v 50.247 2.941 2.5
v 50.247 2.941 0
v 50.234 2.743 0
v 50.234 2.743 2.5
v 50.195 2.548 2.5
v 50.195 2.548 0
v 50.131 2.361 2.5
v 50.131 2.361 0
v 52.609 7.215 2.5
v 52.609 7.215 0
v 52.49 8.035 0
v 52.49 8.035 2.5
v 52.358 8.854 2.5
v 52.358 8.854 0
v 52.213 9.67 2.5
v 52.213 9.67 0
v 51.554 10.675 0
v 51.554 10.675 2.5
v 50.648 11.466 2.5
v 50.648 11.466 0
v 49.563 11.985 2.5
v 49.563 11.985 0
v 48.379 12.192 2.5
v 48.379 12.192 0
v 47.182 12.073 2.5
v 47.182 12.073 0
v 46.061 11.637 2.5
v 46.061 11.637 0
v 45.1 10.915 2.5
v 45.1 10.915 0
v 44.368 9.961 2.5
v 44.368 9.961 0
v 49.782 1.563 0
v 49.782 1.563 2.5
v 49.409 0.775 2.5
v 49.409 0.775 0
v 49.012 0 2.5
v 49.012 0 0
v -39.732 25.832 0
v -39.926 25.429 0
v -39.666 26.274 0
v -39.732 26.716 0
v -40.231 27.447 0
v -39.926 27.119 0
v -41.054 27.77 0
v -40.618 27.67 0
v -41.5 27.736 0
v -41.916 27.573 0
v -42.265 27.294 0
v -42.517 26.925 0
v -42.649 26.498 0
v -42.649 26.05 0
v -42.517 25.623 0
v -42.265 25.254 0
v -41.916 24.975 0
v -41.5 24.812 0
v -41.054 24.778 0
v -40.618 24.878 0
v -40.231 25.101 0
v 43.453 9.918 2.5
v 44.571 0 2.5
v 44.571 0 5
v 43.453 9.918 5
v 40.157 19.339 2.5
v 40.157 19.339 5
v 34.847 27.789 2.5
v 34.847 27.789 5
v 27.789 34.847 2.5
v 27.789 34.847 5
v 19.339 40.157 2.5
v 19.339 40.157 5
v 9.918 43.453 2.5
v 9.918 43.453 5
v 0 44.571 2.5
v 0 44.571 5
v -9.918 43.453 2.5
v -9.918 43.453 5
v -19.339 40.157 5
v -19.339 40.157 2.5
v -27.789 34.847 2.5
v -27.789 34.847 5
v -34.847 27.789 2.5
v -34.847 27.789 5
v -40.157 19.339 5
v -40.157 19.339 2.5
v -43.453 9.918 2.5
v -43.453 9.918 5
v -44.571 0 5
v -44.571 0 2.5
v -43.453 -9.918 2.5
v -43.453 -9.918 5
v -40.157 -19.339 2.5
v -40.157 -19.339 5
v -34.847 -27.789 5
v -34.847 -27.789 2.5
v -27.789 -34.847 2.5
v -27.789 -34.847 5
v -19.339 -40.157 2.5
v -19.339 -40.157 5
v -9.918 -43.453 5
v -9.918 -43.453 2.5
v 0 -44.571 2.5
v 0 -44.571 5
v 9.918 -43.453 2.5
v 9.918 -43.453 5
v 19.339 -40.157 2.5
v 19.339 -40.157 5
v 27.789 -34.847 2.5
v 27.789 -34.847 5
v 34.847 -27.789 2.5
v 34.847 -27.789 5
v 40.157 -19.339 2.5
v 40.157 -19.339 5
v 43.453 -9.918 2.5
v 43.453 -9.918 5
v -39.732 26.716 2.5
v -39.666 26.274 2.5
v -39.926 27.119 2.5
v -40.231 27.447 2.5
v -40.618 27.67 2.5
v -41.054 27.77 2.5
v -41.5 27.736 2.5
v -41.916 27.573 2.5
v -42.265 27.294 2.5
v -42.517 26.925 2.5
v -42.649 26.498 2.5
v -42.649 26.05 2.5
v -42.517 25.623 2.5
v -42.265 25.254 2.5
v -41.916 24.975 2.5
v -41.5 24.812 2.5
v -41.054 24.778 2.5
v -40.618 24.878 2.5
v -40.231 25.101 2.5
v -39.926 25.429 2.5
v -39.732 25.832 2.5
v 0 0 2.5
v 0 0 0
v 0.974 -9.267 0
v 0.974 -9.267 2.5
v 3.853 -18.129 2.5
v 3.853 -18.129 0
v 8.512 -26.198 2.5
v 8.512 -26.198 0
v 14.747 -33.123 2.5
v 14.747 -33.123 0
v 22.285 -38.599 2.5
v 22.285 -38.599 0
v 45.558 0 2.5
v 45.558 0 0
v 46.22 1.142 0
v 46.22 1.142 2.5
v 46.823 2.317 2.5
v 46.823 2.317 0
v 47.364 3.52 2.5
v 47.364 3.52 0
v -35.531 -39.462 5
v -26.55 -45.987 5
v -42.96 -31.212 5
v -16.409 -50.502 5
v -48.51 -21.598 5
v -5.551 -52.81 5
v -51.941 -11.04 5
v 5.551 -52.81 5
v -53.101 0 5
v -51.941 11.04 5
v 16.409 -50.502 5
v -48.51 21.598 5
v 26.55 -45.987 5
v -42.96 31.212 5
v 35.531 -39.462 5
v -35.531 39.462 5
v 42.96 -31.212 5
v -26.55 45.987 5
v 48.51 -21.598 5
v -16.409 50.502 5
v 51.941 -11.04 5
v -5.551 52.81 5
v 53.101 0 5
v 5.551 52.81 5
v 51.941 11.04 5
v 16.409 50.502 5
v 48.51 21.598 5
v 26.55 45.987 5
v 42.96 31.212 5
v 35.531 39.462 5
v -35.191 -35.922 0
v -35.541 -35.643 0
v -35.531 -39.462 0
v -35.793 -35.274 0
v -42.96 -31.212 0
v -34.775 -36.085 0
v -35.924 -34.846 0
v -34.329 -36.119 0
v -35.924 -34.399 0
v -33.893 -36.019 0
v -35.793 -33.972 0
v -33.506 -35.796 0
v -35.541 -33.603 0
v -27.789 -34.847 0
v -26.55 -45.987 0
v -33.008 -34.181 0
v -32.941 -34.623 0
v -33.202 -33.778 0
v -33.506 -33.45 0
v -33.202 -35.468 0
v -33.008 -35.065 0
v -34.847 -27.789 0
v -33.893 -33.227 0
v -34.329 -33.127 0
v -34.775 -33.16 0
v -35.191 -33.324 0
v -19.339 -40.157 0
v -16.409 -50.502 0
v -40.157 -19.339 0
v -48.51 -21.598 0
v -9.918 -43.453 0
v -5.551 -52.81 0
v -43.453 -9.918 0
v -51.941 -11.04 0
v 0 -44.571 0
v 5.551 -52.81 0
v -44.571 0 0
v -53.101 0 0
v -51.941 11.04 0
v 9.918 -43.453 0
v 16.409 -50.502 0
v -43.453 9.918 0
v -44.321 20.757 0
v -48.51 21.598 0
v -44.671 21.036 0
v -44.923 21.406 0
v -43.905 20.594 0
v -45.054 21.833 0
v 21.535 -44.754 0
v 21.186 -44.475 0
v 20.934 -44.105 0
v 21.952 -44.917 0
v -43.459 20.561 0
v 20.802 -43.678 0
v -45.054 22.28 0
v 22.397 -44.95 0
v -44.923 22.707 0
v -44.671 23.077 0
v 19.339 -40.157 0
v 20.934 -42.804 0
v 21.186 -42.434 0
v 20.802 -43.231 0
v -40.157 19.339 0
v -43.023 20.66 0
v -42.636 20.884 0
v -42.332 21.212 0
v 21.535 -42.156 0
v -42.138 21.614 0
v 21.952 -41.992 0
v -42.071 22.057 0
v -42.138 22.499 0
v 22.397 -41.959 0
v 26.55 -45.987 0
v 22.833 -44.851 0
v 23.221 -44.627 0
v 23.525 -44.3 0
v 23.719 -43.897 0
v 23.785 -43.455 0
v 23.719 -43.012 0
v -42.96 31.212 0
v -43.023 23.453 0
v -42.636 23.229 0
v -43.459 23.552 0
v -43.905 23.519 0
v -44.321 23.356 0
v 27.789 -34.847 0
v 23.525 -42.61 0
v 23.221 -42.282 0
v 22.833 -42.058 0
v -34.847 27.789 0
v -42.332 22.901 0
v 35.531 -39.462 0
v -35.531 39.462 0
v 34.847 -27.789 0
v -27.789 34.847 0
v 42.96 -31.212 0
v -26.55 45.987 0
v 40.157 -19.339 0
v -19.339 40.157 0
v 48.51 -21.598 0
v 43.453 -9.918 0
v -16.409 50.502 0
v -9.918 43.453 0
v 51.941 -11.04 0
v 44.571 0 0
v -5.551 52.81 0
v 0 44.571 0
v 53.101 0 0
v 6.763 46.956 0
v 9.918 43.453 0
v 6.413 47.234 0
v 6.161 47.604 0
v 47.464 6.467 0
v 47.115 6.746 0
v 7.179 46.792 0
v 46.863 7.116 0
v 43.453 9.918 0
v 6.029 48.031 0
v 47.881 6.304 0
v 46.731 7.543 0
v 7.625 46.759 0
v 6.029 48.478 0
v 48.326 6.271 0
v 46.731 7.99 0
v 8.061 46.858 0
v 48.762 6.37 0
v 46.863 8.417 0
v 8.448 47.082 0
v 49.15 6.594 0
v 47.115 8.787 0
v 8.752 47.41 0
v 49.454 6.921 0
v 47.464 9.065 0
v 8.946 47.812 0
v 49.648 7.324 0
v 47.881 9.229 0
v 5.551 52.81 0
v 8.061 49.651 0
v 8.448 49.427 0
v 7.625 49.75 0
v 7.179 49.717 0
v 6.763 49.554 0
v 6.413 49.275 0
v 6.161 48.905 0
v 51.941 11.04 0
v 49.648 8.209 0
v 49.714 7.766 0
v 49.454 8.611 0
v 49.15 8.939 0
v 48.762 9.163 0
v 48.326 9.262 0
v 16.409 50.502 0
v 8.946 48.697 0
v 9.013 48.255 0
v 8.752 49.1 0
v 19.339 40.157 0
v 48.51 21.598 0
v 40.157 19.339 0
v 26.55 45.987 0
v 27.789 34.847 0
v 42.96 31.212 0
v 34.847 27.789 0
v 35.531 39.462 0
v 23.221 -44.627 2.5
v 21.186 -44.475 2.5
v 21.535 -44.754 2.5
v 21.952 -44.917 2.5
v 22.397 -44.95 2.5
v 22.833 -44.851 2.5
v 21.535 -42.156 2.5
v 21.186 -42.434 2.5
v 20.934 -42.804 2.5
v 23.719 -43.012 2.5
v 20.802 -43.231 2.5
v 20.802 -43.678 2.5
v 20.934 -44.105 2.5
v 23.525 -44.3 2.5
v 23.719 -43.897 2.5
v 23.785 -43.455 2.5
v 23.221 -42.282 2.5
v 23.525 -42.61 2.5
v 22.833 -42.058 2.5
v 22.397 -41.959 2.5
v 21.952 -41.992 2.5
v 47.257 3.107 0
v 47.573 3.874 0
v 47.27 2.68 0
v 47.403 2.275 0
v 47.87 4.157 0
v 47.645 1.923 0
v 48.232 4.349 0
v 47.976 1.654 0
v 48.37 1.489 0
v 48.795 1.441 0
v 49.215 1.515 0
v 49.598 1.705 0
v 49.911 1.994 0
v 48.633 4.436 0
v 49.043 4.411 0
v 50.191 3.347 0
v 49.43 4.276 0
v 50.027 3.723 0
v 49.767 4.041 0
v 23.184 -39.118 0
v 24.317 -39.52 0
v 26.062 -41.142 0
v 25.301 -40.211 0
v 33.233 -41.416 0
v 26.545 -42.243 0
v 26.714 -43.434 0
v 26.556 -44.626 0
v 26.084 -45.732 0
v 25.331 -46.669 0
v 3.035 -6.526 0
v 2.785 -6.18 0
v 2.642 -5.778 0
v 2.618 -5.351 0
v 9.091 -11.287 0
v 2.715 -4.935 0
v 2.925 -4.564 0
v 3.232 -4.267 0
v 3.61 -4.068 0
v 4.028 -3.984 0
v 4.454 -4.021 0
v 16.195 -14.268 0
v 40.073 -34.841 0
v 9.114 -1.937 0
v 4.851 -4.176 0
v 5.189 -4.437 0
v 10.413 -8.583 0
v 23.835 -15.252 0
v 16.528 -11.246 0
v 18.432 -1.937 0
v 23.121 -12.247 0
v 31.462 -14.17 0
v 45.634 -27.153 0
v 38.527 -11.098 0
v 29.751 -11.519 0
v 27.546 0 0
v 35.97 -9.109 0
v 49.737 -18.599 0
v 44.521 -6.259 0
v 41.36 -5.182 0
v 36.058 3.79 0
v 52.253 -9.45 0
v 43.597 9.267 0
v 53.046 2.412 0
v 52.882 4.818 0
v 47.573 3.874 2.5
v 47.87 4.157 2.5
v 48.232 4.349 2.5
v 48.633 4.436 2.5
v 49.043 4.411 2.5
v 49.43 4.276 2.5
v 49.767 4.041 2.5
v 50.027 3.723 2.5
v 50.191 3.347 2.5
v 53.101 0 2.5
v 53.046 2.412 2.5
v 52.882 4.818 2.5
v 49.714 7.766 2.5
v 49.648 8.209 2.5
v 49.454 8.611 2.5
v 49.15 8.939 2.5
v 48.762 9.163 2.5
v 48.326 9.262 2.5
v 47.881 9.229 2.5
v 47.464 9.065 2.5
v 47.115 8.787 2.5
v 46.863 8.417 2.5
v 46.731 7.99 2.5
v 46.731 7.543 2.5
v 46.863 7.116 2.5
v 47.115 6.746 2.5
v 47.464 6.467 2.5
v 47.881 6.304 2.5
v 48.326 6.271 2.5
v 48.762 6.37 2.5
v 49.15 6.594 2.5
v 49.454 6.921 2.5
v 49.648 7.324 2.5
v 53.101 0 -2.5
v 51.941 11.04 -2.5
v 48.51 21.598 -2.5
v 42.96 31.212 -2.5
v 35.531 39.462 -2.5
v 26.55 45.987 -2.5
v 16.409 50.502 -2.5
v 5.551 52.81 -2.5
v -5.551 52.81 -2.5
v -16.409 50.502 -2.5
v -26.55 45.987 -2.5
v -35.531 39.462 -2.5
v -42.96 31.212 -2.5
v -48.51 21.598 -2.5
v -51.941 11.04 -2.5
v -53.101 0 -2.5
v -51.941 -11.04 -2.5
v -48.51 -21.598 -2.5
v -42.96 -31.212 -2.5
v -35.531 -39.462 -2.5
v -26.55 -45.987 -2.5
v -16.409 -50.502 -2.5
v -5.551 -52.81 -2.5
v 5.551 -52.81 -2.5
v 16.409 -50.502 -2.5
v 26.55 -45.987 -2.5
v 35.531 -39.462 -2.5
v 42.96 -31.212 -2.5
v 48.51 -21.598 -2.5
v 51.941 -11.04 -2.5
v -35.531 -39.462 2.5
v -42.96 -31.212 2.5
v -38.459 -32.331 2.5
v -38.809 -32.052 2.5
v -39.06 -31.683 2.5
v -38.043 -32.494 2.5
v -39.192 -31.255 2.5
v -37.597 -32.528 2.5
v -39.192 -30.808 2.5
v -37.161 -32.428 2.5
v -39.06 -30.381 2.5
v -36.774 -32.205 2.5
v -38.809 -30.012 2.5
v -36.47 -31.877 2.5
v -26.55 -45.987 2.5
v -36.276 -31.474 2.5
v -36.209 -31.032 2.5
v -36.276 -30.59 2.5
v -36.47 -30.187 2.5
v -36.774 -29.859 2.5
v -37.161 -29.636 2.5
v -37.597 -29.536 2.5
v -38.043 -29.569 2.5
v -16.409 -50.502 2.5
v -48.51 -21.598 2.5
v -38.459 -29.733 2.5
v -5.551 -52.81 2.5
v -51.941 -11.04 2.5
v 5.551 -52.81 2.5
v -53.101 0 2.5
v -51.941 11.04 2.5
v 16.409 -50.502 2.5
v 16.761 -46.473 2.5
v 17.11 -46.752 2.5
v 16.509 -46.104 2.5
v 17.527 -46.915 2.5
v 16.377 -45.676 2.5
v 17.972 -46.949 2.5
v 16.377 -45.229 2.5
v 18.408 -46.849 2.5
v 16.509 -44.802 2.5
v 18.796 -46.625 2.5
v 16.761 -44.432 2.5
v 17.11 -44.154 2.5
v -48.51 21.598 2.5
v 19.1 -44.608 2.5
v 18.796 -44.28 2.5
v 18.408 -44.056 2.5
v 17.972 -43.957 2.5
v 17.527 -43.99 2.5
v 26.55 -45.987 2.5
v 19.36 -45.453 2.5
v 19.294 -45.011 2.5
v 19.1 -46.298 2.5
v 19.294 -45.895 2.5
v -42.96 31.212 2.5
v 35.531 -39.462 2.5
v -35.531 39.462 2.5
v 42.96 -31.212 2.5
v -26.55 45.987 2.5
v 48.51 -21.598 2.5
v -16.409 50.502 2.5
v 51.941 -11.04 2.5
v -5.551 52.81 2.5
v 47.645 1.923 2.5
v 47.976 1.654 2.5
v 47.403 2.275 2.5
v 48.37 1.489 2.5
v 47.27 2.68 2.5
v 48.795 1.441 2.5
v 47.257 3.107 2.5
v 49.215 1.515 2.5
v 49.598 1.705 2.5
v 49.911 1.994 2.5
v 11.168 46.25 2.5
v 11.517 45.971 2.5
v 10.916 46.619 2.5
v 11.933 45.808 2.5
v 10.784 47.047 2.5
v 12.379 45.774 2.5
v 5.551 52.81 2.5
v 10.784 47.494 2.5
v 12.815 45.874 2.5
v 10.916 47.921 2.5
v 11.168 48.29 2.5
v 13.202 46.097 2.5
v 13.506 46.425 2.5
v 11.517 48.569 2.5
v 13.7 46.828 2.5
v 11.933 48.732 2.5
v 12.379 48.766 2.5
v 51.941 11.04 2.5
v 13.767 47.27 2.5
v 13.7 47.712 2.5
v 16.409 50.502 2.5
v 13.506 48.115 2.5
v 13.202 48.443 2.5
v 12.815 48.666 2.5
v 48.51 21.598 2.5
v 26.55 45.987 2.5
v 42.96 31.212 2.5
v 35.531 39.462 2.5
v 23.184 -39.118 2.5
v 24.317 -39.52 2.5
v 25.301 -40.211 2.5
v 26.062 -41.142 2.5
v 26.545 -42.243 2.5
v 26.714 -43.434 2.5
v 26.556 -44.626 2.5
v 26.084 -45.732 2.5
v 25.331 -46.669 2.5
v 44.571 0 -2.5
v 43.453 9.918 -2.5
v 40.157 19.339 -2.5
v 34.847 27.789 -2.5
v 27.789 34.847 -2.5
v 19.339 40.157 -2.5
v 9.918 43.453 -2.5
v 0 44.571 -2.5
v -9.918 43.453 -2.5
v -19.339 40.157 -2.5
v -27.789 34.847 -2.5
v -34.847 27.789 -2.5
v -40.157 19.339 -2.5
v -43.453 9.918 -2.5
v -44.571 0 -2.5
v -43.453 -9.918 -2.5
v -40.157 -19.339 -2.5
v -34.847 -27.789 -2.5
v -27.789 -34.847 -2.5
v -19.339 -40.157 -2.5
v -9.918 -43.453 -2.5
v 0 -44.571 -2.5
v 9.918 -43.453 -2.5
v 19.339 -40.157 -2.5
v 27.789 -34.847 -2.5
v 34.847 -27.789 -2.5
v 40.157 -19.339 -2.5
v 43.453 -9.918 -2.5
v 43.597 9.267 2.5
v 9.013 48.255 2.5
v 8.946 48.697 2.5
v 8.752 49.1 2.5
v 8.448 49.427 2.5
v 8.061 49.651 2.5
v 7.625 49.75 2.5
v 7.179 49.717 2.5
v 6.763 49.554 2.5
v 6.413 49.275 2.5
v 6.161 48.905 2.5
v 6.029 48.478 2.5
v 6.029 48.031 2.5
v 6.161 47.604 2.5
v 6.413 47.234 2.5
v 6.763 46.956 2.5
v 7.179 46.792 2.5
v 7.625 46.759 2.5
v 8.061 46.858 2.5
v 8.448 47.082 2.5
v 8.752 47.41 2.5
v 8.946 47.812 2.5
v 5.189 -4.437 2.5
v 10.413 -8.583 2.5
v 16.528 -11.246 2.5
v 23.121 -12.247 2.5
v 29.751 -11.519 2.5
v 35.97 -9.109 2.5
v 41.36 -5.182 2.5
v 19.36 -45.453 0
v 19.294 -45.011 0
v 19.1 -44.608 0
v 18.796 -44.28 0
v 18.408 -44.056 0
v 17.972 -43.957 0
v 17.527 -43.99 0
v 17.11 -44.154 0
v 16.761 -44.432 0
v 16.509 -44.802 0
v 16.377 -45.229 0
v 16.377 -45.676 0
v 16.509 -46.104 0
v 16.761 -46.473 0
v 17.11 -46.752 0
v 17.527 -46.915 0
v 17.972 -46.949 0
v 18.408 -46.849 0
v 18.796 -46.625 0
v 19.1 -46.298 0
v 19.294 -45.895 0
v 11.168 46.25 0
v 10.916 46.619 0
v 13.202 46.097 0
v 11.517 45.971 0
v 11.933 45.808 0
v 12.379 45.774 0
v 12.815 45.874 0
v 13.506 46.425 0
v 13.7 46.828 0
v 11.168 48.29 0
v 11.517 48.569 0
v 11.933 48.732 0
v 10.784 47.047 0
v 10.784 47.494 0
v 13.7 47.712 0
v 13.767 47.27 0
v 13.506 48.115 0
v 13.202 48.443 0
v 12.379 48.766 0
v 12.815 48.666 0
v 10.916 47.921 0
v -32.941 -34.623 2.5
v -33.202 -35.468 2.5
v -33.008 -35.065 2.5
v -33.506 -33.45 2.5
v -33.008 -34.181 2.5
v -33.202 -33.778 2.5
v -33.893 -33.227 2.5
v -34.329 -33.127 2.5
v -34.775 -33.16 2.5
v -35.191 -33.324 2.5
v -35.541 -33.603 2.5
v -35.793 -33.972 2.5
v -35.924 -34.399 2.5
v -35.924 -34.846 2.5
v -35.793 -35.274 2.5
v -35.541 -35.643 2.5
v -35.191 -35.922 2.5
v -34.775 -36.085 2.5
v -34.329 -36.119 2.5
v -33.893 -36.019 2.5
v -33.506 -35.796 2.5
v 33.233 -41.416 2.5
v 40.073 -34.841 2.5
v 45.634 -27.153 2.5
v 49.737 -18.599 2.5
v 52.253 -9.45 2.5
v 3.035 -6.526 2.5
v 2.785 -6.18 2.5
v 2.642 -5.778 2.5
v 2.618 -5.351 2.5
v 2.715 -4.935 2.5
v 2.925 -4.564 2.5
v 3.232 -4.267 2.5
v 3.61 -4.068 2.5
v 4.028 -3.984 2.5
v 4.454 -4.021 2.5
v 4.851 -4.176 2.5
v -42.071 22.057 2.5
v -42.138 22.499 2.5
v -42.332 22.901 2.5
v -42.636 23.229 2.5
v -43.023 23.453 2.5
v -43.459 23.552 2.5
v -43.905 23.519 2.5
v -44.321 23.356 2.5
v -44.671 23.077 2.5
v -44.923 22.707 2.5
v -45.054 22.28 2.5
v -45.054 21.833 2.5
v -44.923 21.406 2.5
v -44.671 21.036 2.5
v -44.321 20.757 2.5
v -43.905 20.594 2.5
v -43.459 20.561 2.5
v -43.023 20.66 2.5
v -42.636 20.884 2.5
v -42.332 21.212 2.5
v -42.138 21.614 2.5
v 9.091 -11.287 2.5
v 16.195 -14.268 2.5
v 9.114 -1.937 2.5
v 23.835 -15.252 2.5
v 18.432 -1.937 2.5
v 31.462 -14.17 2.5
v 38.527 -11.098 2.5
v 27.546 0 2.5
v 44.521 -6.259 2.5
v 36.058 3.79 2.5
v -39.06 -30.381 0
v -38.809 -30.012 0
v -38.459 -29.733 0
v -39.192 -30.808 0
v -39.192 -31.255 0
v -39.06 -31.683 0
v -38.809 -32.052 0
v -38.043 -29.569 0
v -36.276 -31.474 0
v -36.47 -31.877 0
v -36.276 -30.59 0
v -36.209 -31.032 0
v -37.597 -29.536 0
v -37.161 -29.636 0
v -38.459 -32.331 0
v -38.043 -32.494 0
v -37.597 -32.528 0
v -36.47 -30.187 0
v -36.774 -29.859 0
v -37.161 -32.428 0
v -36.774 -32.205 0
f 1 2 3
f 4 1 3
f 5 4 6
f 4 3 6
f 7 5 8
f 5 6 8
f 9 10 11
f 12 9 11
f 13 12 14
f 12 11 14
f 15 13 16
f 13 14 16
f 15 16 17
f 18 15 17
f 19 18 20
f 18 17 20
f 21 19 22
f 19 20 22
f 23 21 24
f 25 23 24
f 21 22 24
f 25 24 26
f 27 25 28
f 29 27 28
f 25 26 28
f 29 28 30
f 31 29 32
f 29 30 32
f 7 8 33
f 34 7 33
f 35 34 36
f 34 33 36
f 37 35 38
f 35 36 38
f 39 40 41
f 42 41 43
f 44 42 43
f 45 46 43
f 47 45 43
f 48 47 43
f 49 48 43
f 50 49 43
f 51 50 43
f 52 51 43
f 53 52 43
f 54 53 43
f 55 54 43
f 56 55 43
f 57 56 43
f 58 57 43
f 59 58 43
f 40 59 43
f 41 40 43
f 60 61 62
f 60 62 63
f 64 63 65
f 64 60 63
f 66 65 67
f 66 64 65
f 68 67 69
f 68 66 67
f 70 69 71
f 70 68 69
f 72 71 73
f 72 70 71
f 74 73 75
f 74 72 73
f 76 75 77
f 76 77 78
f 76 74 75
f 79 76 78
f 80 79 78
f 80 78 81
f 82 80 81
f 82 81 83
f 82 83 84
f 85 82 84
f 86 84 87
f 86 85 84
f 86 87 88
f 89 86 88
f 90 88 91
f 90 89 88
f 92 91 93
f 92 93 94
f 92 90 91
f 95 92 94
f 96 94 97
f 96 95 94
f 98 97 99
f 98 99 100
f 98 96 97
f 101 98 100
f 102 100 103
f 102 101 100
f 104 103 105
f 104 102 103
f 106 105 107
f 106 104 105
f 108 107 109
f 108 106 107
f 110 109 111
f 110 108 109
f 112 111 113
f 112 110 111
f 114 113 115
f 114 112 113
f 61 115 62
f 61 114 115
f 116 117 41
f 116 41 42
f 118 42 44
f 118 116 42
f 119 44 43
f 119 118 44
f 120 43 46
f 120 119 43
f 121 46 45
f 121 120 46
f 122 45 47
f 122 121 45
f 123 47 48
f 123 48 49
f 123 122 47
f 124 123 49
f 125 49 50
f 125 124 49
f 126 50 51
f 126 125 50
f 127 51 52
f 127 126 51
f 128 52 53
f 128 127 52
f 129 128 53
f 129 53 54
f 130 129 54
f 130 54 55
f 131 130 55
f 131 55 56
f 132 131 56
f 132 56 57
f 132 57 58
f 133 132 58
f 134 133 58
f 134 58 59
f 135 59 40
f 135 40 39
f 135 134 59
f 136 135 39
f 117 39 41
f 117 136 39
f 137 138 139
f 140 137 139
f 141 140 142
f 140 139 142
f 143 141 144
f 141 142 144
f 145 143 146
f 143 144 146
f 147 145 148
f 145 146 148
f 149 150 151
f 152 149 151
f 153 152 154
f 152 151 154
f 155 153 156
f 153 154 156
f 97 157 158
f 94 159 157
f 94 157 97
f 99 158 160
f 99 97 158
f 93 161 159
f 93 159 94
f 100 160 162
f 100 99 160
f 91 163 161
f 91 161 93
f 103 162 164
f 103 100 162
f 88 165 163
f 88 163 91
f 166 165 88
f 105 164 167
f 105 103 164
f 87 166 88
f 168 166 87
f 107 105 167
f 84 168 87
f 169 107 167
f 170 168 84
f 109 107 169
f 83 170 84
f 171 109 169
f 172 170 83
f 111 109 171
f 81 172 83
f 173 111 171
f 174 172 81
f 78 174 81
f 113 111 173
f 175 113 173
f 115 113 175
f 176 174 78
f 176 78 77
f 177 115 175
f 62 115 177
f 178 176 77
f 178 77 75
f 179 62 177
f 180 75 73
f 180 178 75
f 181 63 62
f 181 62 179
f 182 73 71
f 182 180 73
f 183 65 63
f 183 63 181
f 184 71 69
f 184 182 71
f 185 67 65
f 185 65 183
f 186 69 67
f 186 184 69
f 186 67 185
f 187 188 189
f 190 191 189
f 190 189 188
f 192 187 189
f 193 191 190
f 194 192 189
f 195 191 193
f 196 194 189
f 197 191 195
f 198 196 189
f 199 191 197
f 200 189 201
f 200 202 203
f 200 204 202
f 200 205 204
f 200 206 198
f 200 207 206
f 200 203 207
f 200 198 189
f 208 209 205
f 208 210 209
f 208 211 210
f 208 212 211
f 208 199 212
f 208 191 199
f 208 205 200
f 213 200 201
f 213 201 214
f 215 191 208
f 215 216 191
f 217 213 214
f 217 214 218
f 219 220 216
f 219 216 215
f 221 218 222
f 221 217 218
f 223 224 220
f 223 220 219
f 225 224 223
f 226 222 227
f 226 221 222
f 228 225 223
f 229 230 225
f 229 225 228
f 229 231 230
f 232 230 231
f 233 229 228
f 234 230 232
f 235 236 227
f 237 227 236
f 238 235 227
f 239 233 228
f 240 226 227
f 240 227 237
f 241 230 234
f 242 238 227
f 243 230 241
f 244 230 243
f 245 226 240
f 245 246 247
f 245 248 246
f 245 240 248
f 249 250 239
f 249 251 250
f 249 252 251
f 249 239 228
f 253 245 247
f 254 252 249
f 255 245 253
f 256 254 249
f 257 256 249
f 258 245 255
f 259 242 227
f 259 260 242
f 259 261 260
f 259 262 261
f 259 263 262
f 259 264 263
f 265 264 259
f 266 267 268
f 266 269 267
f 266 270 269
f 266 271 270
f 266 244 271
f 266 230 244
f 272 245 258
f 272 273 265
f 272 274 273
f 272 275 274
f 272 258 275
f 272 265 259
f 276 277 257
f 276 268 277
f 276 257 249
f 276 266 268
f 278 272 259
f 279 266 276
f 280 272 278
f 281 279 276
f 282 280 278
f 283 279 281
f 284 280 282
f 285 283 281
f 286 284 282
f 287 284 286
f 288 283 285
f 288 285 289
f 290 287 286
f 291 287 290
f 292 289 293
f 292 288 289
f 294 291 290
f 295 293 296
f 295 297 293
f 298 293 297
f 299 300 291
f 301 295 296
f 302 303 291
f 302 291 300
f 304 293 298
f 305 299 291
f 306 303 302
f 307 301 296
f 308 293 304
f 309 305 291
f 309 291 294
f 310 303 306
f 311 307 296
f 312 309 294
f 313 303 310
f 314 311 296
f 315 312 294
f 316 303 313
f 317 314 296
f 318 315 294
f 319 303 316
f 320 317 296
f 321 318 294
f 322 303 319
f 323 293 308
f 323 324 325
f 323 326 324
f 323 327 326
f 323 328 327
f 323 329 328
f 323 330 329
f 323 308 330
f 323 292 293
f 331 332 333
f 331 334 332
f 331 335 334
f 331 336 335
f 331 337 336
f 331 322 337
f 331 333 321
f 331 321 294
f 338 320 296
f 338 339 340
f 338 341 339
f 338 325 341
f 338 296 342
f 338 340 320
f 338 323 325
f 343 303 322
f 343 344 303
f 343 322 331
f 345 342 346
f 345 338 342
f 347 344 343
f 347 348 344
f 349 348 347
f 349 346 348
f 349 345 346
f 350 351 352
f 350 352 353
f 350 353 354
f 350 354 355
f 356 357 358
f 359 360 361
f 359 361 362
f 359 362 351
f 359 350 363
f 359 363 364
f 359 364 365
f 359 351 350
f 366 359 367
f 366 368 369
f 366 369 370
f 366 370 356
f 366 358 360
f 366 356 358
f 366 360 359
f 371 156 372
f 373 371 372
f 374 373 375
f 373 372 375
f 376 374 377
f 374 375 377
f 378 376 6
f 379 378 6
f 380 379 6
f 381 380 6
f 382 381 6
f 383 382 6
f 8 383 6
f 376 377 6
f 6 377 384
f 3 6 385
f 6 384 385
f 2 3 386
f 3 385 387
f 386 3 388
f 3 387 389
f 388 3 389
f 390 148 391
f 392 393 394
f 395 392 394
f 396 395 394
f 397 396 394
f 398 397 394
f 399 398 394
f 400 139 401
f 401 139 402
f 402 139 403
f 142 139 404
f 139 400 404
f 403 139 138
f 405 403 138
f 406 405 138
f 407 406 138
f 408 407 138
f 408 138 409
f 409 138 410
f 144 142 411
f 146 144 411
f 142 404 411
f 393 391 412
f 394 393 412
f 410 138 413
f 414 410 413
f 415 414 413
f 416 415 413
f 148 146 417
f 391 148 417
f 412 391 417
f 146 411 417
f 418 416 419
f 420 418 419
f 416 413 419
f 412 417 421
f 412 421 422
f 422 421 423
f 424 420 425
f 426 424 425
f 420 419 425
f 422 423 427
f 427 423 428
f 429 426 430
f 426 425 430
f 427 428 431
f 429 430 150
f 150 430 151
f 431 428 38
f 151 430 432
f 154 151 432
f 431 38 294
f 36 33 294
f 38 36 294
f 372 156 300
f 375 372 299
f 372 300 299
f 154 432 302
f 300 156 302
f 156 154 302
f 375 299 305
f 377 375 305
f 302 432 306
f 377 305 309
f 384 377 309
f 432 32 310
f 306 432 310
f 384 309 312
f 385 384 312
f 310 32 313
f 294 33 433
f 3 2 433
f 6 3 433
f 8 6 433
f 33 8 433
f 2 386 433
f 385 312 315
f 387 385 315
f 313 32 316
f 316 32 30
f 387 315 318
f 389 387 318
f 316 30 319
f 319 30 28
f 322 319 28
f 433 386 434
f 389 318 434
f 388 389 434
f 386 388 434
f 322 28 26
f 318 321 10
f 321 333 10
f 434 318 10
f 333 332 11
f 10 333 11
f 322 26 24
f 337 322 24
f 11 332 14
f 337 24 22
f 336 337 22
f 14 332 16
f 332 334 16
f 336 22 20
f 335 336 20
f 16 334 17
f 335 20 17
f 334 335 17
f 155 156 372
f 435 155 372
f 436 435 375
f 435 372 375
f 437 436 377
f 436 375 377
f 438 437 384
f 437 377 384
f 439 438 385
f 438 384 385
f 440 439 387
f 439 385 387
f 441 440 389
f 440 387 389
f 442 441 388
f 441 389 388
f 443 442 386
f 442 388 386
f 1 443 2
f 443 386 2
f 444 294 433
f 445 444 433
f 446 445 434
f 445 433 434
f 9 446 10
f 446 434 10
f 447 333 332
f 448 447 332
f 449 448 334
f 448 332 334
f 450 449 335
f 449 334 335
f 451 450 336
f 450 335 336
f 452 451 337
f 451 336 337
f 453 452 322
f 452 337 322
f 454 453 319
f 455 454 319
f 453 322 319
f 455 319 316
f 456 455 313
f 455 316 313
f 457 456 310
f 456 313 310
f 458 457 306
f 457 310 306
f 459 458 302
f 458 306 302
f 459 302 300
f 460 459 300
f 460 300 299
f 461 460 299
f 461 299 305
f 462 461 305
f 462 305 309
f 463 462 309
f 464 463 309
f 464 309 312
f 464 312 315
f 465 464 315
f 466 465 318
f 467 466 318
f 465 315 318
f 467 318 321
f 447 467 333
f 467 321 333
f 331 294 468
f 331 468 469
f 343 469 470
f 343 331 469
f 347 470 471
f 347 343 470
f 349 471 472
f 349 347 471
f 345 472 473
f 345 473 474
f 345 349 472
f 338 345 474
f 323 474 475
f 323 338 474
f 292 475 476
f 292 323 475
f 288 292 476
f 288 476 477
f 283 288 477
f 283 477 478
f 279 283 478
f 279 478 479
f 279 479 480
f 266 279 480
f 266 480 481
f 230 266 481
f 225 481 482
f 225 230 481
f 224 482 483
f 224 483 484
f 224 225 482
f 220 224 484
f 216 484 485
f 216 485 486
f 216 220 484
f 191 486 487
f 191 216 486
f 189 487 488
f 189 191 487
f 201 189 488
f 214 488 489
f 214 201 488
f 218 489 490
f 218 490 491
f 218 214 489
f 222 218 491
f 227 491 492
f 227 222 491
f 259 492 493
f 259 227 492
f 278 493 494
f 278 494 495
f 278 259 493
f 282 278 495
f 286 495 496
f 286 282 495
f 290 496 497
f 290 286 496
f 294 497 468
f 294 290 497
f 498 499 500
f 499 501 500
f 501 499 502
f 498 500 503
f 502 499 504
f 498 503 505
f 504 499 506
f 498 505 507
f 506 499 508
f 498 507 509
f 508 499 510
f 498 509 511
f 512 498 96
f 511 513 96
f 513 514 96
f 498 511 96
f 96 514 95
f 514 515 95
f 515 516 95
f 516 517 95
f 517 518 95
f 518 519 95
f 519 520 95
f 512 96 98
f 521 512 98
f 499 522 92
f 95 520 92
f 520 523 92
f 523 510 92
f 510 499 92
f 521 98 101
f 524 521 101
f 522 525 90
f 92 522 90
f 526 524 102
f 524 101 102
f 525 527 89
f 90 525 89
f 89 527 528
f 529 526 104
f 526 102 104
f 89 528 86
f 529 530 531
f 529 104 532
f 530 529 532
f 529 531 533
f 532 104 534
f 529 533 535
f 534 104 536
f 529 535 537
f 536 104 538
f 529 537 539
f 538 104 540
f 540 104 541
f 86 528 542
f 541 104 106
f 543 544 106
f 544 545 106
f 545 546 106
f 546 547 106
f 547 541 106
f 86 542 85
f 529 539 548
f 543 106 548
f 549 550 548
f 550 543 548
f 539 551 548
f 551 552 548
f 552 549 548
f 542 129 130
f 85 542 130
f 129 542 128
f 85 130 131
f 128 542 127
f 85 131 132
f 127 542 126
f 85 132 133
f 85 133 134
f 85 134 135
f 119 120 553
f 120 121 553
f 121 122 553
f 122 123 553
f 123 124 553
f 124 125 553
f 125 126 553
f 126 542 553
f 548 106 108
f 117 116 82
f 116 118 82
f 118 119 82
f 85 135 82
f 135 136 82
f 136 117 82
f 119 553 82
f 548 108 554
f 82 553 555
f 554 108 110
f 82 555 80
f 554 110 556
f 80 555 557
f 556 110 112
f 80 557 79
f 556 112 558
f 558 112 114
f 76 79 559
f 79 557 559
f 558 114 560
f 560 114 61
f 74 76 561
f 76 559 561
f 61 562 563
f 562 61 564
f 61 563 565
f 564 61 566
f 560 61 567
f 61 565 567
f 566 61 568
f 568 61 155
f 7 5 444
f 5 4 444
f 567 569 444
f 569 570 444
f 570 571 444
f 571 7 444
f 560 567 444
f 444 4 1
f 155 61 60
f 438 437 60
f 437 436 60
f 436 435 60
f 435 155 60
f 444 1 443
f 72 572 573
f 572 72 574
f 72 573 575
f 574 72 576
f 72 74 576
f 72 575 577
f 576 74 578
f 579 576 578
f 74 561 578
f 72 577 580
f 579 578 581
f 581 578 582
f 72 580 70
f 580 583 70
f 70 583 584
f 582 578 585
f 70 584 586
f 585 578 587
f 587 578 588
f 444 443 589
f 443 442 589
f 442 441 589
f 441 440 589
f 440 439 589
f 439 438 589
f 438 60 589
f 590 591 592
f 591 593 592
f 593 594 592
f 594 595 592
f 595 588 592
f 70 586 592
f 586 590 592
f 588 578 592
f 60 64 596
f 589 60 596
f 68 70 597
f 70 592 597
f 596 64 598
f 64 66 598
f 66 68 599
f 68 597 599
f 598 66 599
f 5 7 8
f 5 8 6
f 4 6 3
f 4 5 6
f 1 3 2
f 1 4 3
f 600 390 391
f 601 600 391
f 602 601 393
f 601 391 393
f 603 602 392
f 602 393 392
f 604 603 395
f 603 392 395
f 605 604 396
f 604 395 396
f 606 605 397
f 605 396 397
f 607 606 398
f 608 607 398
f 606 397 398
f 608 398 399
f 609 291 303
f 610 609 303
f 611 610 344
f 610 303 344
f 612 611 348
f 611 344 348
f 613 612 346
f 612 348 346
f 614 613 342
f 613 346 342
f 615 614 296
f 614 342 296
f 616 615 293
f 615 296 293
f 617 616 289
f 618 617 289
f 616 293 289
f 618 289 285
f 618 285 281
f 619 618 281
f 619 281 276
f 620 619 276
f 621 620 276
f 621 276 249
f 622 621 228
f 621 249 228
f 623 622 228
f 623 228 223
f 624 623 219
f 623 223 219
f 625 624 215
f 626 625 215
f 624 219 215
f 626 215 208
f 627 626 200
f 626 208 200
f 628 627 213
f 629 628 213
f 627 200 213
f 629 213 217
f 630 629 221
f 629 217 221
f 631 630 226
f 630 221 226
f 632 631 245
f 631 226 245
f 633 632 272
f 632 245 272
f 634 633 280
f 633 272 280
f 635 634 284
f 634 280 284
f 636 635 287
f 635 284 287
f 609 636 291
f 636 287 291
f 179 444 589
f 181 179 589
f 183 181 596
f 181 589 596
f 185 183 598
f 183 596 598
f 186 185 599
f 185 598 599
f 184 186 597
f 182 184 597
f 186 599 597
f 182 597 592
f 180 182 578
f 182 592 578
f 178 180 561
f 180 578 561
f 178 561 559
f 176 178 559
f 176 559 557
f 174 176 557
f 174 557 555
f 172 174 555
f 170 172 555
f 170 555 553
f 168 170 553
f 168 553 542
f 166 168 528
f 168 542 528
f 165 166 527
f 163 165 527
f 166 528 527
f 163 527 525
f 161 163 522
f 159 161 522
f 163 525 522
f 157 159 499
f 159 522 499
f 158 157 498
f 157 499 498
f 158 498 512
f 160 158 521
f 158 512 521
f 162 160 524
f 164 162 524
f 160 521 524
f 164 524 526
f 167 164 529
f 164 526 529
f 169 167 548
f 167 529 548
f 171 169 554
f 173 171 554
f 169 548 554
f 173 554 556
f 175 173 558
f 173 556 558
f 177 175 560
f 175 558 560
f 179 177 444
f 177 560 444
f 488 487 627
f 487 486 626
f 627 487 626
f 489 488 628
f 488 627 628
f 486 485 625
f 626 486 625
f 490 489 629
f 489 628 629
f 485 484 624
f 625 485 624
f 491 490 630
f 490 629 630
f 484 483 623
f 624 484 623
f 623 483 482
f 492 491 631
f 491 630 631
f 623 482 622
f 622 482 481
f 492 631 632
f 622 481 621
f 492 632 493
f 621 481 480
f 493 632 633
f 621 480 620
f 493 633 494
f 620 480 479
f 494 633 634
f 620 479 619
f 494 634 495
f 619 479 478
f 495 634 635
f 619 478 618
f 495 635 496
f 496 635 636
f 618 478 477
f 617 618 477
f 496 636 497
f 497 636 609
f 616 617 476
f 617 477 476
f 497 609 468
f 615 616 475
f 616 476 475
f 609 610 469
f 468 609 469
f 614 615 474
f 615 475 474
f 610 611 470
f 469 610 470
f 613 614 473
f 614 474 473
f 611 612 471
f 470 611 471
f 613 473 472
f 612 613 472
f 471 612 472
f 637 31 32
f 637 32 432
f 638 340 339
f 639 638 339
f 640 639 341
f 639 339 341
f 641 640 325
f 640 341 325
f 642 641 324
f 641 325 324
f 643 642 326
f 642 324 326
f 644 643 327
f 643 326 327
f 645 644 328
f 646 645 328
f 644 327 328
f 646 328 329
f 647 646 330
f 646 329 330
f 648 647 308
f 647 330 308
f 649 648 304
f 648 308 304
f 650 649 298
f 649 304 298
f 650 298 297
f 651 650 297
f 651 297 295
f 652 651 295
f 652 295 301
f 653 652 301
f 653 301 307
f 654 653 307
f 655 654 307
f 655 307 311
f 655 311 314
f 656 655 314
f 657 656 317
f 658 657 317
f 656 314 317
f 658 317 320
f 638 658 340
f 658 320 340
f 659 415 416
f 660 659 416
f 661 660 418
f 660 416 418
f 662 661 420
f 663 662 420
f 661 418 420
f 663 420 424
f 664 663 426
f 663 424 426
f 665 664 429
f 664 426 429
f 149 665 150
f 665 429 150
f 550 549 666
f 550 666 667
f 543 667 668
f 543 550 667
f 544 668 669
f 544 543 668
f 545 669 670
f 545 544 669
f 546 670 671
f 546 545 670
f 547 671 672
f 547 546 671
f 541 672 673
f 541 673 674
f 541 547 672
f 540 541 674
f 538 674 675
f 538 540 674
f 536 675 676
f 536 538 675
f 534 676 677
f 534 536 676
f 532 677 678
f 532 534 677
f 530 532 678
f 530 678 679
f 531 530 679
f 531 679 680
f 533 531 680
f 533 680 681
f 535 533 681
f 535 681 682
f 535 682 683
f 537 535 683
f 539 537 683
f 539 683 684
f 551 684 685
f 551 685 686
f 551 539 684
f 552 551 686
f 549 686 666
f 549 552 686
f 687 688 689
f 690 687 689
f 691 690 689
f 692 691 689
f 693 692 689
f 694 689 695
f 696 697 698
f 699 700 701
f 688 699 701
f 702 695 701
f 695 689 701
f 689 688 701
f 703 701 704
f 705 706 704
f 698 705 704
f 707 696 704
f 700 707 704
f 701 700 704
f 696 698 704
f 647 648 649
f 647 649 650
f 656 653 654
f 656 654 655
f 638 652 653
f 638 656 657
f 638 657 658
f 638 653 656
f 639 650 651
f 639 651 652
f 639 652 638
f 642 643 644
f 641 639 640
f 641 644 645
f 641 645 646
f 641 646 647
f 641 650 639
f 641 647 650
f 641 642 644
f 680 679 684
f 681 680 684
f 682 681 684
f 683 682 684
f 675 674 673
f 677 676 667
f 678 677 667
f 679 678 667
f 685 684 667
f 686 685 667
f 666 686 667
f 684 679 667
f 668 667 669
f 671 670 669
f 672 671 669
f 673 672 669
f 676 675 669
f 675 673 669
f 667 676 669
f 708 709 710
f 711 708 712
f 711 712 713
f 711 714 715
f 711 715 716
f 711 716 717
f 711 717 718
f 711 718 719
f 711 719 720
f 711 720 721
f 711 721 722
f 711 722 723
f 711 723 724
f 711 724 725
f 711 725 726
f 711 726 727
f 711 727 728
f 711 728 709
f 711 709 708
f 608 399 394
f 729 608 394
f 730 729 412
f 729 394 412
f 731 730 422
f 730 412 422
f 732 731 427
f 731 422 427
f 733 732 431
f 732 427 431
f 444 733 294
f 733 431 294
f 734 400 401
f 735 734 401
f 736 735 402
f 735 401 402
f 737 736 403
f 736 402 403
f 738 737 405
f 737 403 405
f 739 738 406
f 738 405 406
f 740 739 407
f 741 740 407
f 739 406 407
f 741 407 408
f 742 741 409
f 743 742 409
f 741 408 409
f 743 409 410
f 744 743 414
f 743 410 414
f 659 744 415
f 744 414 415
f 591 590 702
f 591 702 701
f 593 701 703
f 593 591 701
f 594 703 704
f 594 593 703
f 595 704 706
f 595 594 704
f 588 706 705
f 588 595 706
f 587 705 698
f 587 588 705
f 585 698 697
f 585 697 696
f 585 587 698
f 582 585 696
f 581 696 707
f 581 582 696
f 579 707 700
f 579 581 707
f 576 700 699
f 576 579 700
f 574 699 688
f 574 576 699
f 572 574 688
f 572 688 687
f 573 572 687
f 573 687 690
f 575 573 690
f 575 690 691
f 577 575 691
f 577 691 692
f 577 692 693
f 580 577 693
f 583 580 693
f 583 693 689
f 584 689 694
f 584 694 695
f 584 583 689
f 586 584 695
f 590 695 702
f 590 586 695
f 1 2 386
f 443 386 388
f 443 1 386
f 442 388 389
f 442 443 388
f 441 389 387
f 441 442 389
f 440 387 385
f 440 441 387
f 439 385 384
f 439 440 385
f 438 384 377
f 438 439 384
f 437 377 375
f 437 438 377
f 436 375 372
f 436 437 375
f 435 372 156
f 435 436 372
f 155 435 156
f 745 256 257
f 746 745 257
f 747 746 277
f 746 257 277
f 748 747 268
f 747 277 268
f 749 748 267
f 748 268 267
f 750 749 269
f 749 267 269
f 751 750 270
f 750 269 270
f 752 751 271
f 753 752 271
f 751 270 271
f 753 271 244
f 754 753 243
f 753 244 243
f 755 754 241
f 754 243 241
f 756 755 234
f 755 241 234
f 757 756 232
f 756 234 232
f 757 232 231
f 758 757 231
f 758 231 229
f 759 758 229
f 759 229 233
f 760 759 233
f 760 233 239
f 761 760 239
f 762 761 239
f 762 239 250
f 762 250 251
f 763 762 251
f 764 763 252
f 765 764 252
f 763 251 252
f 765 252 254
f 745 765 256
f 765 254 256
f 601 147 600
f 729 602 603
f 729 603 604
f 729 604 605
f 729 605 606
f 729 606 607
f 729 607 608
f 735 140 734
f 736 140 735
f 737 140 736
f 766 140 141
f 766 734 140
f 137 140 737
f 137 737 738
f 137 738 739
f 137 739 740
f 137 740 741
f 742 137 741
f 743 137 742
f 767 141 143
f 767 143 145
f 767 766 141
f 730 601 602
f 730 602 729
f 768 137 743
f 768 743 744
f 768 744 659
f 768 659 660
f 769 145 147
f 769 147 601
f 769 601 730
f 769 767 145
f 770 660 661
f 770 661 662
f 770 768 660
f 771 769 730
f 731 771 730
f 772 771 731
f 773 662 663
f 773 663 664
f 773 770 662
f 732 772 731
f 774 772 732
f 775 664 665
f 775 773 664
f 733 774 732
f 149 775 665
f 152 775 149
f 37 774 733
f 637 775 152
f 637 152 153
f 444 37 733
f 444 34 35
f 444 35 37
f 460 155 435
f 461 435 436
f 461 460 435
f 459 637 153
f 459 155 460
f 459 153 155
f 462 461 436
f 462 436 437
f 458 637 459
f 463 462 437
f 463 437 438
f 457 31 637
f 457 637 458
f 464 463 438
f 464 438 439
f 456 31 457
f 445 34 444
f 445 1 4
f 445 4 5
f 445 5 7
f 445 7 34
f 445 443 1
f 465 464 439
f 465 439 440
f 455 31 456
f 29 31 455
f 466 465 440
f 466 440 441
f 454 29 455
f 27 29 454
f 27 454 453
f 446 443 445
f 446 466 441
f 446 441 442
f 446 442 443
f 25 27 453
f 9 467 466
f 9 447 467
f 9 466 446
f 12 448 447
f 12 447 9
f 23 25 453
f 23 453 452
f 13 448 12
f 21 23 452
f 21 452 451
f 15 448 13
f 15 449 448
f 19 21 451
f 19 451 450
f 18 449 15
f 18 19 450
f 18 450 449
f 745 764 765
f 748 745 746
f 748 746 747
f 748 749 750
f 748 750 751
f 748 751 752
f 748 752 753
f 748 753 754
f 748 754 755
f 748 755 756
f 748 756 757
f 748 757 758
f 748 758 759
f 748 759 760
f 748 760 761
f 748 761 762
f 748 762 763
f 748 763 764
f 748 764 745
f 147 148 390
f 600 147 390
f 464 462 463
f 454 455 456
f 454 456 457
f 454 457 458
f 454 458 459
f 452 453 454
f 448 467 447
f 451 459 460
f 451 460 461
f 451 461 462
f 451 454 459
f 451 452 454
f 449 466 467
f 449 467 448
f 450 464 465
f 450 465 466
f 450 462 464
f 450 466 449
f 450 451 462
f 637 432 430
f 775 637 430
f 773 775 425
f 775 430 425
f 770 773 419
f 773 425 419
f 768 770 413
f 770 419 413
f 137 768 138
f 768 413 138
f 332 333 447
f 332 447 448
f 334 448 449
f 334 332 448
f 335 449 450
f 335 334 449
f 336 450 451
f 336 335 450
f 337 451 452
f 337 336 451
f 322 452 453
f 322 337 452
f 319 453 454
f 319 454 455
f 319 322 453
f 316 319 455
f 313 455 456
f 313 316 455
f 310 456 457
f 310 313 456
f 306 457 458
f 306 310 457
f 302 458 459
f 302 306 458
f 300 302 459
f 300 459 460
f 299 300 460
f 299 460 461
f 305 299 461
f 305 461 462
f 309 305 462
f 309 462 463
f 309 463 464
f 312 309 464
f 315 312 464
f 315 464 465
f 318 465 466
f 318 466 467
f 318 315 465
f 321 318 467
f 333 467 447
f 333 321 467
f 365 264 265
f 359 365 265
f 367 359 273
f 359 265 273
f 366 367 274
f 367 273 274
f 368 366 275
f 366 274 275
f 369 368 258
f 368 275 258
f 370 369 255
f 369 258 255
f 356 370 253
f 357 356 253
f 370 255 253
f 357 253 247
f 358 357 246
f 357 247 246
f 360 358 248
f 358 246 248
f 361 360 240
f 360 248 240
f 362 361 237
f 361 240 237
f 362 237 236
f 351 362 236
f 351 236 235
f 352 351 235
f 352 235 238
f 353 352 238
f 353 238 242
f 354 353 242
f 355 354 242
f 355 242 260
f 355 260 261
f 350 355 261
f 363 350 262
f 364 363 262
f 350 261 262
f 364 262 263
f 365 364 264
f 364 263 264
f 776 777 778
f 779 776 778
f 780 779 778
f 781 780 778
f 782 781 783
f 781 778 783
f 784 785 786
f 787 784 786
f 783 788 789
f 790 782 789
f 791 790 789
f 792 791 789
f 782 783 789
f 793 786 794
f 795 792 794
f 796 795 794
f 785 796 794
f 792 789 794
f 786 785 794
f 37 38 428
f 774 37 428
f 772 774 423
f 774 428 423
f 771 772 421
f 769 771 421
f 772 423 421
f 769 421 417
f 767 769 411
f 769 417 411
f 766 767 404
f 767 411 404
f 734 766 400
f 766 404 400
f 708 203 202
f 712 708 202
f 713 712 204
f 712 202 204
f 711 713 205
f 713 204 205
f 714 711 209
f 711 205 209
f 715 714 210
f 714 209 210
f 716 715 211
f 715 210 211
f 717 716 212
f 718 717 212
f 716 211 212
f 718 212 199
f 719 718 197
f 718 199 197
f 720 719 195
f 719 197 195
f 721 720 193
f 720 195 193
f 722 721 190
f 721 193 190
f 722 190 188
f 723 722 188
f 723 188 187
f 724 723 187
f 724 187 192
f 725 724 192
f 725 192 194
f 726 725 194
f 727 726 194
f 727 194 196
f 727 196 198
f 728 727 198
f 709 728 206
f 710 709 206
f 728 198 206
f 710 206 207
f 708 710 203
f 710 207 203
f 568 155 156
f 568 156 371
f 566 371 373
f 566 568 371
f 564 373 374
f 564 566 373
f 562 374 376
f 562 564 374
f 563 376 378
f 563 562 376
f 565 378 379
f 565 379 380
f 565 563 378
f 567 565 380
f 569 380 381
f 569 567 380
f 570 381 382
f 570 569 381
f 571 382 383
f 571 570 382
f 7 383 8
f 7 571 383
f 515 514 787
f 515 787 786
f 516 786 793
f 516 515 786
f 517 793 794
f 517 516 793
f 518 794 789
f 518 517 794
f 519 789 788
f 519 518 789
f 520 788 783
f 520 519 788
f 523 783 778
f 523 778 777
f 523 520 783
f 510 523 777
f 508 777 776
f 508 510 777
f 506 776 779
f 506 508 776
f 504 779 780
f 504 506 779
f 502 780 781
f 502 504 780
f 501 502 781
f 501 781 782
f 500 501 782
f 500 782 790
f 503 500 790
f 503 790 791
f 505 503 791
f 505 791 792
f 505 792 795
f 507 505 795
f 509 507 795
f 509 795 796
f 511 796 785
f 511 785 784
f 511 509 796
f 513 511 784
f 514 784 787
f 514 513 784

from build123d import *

# Parameters (mm, degrees)
F1_R          = 1.5
F2_DEPTH      = 2.5
F3_R          = 53.1009930313
F3_R_2        = 1.5
F3_R_3        = 44.5707546786
F4_DEPTH      = 2.5
F5_DEPTH      = 2.5
F6_R          = 53.1009930313
F6_R_2        = 1.5
F6_R_3        = 44.5707546786
F7_DEPTH      = 2.5
F8_DEPTH      = 2.5
F8_DEPTH_BACK = 2.5


with BuildPart() as f2:
    # F1 (on Top) → F2 (new body)
    with BuildSketch(Plane.XY):
        with BuildLine():
            ThreePointArc((43.5967767518, 9.2667809662), (23.0399016141, -1.2074700785), (0, 0))
            ThreePointArc((0, 0), (5.9713488611, -22.2853773393), (22.2853773393, -38.5994058175))
            Line((22.2853773393, -38.5994058175), (23.1836535337, -39.1180258202))
            ThreePointArc((23.1836535337, -39.1180258202), (26.5451077793, -42.2431398769), (25.3313187663, -46.6694734325))
            ThreePointArc((25.3313187663, -46.6694734325), (45.6335054658, -27.1532436334), (53.1009930313, 0))
            ThreePointArc((53.1009930313, 0), (52.977739866, 3.6158732827), (52.6085525382, 7.2149608971))
            ThreePointArc((52.6085525382, 7.2149608971), (52.4252049406, 8.4447230767), (52.2131148088, 9.6698553699))
            ThreePointArc((52.2131148088, 9.6698553699), (48.3785028701, 12.1920496116), (44.3675962945, 9.96083))
            Line((44.3675962945, 9.96083), (43.5967767518, 9.2667809662))
        make_face()
        with BuildLine():
            ThreePointArc((50.1306670439, 2.3607243834), (49.5983825966, 1.1676379558), (49.0123761454, 0))
            ThreePointArc((49.0123761454, 0), (27.6850730752, -14.9678218042), (3.035185807, -6.5255114881))
            ThreePointArc((3.035185807, -6.5255114881), (3.0681178737, -4.404446784), (5.1891825778, -4.4373788507))
            ThreePointArc((5.1891825778, -4.4373788507), (26.4597740482, -12.0987734107), (45.5583266127, 0))
            ThreePointArc((45.5583266127, 0), (46.5289054338, 1.7254070276), (47.3638609946, 3.5203727292))
            ThreePointArc((47.3638609946, 3.5203727292), (49.0429796454, 4.411110445), (50.2472640193, 2.9405485563))
            ThreePointArc((50.2472640193, 2.9405485563), (50.2178259079, 2.6448329302), (50.1306670439, 2.3607243834))
        make_face(mode=Mode.SUBTRACT)
        with Locations((48.2143656672, 7.7664353785)):
            Circle(F1_R, mode=Mode.SUBTRACT)
    extrude(amount=F2_DEPTH)


with BuildPart() as f4:
    # F3 (on Top) → F4 (new body)
    with BuildSketch(Plane.XY):
        Circle(F3_R)
        with Locations((-34.4412450194, -34.6228712947)):
            Circle(F3_R_2, mode=Mode.SUBTRACT)
        with Locations((22.2853773393, -43.4546261291)):
            Circle(F3_R_2, mode=Mode.SUBTRACT)
        with Locations((-43.5712373761, 22.0565148808)):
            Circle(F3_R_2, mode=Mode.SUBTRACT)
        Circle(F3_R_3, mode=Mode.SUBTRACT)
        with Locations((48.2143656672, 7.7664353785)):
            Circle(F3_R_2, mode=Mode.SUBTRACT)
        with Locations((7.512739389, 48.2545471645)):
            Circle(F3_R_2, mode=Mode.SUBTRACT)
        with Locations((22.2853773393, -43.4546261291)):
            Circle(F3_R_2)
        with Locations((48.2143656672, 7.7664353785)):
            Circle(F3_R_2)
        with Locations((7.512739389, 48.2545471645)):
            Circle(F3_R_2)
        with Locations((-43.5712373761, 22.0565148808)):
            Circle(F3_R_2)
        with Locations((-34.4412450194, -34.6228712947)):
            Circle(F3_R_2)
    extrude(amount=-F4_DEPTH)

    # F3 (on Top) → F5 (join)
    with BuildSketch(Plane.XY):
        with Locations((7.512739389, 48.2545471645)):
            Circle(F3_R_2)
        with Locations((-43.5712373761, 22.0565148808)):
            Circle(F3_R_2)
        with Locations((-34.4412450194, -34.6228712947)):
            Circle(F3_R_2)
        with Locations((22.2853773393, -43.4546261291)):
            Circle(F3_R_2)
        with Locations((48.2143656672, 7.7664353785)):
            Circle(F3_R_2)
    extrude(amount=F5_DEPTH)


with BuildPart() as f7:
    # F6 (on face) → F7 (new body)
    with BuildSketch(Plane.XY.offset(2.5)):
        Circle(F6_R)
        with Locations((-37.7089539458, -31.031876635)):
            Circle(F6_R_2, mode=Mode.SUBTRACT)
        with Locations((17.8603608772, -45.4527236204)):
            Circle(F6_R_2, mode=Mode.SUBTRACT)
        with Locations((-41.1657760959, 26.2739691253)):
            Circle(F6_R_2, mode=Mode.SUBTRACT)
        Circle(F6_R_3, mode=Mode.SUBTRACT)
        with Locations((48.7472640193, 2.9405485563)):
            Circle(F6_R_2, mode=Mode.SUBTRACT)
        with Locations((12.2671051452, 47.2700825738)):
            Circle(F6_R_2, mode=Mode.SUBTRACT)
    extrude(amount=F7_DEPTH)

    # F6 (on face) → F8 (join, two sides)
    with BuildSketch(Plane.XY.offset(2.5)) as f8_sk:
        with Locations((-37.7089539458, -31.031876635)):
            Circle(F6_R_2)
        with Locations((-41.1657760959, 26.2739691253)):
            Circle(F6_R_2)
        with Locations((12.2671051452, 47.2700825738)):
            Circle(F6_R_2)
        with BuildLine():
            ThreePointArc((50.1306670439, 2.3607243834), (50.2178259079, 2.6448329302), (50.2472640193, 2.9405485563))
            ThreePointArc((50.2472640193, 2.9405485563), (49.0429796454, 4.411110445), (47.3638609946, 3.5203727292))
            ThreePointArc((47.3638609946, 3.5203727292), (48.1674398464, 1.5571455317), (50.1306670439, 2.3607243834))
        make_face()
        with Locations((17.8603608772, -45.4527236204)):
            Circle(F6_R_2)
    extrude(amount=-F8_DEPTH)
    extrude(f8_sk.sketch, amount=F8_DEPTH_BACK)


solid = Compound([f2.part, f4.part, f7.part])
